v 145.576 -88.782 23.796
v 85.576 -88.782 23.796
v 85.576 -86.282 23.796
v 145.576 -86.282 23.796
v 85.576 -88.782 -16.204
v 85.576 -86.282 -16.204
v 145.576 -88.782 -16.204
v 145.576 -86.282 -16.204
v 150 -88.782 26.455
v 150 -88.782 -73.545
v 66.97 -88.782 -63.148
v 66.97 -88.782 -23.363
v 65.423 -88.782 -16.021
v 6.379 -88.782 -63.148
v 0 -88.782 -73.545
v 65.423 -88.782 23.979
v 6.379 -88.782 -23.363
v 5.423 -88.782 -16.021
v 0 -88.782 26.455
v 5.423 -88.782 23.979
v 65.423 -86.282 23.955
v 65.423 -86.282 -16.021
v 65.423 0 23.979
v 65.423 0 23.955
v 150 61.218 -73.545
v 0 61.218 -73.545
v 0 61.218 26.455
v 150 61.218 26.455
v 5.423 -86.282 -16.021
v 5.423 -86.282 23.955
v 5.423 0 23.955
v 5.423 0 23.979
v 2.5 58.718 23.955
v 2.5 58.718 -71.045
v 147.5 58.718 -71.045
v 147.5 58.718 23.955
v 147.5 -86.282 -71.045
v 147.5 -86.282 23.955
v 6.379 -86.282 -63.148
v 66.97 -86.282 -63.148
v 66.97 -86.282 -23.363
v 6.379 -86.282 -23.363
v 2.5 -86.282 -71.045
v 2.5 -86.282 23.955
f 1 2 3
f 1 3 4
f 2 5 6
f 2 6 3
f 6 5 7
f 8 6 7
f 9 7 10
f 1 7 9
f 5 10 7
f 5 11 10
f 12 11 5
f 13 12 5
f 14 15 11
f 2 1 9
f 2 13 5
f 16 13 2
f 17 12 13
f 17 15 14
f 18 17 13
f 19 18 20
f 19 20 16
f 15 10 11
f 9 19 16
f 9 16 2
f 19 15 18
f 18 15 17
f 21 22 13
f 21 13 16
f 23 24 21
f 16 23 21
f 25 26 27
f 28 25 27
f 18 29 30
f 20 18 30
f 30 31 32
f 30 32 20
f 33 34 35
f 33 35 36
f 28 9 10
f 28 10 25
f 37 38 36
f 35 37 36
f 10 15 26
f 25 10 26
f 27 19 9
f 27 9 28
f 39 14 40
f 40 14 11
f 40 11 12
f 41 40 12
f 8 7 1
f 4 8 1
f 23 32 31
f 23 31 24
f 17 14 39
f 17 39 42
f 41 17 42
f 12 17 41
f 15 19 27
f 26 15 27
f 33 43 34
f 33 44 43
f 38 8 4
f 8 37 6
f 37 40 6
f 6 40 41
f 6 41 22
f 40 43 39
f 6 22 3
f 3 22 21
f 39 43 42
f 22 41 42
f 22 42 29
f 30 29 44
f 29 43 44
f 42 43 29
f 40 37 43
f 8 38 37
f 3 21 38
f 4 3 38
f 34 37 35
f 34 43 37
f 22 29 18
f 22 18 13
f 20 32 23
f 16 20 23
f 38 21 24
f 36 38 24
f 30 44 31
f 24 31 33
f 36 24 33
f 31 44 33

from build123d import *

# Parameters (mm, degrees)
F0_W     = 150
F0_H     = 100
F1_DEPTH = 150
F2_T     = -2.5
F3_W     = 60
F3_H     = 40
F4_DEPTH = 468.9
F5_W     = 60
F5_H     = 40
F6_DEPTH = 145
F7_W     = 60.590963345
F7_H     = 39.7856272757
F8_DEPTH = 146.1


# Not quite as in the source:
# - a feature names something its author has since deleted; it is built from what else it names


with BuildPart() as f1:
    # F0 (on Right) → F1 (new body)
    with BuildSketch(Plane.YZ):
        with Locations((-13.7818545103, -23.5450232641)):
            Rectangle(F0_W, F0_H)
    extrude(amount=F1_DEPTH)

    # F2 (hollow: no face is removed)
    offset(amount=F2_T, mode=Mode.SUBTRACT)

    # F3 (on Front) → F4 (cut)
    with BuildSketch(Plane.XZ):
        with Locations((35.4225549102, 3.9785955846)):
            Rectangle(F3_W, F3_H)
    extrude(amount=F4_DEPTH, mode=Mode.SUBTRACT)

    # F5 (on face) → F6 (cut)
    with BuildSketch(Plane.XZ.offset(88.7818545103)):
        with Locations((115.576479584, 3.7956100403)):
            Rectangle(F5_W, F5_H)
    extrude(amount=-F6_DEPTH, mode=Mode.SUBTRACT)

    # F7 (on face) → F8 (cut)
    with BuildSketch(Plane.XZ.offset(88.7818545103)):
        with Locations((36.6743972991, -43.25533472)):
            Rectangle(F7_W, F7_H)
    extrude(amount=-F8_DEPTH, mode=Mode.SUBTRACT)


solid = f1.part
